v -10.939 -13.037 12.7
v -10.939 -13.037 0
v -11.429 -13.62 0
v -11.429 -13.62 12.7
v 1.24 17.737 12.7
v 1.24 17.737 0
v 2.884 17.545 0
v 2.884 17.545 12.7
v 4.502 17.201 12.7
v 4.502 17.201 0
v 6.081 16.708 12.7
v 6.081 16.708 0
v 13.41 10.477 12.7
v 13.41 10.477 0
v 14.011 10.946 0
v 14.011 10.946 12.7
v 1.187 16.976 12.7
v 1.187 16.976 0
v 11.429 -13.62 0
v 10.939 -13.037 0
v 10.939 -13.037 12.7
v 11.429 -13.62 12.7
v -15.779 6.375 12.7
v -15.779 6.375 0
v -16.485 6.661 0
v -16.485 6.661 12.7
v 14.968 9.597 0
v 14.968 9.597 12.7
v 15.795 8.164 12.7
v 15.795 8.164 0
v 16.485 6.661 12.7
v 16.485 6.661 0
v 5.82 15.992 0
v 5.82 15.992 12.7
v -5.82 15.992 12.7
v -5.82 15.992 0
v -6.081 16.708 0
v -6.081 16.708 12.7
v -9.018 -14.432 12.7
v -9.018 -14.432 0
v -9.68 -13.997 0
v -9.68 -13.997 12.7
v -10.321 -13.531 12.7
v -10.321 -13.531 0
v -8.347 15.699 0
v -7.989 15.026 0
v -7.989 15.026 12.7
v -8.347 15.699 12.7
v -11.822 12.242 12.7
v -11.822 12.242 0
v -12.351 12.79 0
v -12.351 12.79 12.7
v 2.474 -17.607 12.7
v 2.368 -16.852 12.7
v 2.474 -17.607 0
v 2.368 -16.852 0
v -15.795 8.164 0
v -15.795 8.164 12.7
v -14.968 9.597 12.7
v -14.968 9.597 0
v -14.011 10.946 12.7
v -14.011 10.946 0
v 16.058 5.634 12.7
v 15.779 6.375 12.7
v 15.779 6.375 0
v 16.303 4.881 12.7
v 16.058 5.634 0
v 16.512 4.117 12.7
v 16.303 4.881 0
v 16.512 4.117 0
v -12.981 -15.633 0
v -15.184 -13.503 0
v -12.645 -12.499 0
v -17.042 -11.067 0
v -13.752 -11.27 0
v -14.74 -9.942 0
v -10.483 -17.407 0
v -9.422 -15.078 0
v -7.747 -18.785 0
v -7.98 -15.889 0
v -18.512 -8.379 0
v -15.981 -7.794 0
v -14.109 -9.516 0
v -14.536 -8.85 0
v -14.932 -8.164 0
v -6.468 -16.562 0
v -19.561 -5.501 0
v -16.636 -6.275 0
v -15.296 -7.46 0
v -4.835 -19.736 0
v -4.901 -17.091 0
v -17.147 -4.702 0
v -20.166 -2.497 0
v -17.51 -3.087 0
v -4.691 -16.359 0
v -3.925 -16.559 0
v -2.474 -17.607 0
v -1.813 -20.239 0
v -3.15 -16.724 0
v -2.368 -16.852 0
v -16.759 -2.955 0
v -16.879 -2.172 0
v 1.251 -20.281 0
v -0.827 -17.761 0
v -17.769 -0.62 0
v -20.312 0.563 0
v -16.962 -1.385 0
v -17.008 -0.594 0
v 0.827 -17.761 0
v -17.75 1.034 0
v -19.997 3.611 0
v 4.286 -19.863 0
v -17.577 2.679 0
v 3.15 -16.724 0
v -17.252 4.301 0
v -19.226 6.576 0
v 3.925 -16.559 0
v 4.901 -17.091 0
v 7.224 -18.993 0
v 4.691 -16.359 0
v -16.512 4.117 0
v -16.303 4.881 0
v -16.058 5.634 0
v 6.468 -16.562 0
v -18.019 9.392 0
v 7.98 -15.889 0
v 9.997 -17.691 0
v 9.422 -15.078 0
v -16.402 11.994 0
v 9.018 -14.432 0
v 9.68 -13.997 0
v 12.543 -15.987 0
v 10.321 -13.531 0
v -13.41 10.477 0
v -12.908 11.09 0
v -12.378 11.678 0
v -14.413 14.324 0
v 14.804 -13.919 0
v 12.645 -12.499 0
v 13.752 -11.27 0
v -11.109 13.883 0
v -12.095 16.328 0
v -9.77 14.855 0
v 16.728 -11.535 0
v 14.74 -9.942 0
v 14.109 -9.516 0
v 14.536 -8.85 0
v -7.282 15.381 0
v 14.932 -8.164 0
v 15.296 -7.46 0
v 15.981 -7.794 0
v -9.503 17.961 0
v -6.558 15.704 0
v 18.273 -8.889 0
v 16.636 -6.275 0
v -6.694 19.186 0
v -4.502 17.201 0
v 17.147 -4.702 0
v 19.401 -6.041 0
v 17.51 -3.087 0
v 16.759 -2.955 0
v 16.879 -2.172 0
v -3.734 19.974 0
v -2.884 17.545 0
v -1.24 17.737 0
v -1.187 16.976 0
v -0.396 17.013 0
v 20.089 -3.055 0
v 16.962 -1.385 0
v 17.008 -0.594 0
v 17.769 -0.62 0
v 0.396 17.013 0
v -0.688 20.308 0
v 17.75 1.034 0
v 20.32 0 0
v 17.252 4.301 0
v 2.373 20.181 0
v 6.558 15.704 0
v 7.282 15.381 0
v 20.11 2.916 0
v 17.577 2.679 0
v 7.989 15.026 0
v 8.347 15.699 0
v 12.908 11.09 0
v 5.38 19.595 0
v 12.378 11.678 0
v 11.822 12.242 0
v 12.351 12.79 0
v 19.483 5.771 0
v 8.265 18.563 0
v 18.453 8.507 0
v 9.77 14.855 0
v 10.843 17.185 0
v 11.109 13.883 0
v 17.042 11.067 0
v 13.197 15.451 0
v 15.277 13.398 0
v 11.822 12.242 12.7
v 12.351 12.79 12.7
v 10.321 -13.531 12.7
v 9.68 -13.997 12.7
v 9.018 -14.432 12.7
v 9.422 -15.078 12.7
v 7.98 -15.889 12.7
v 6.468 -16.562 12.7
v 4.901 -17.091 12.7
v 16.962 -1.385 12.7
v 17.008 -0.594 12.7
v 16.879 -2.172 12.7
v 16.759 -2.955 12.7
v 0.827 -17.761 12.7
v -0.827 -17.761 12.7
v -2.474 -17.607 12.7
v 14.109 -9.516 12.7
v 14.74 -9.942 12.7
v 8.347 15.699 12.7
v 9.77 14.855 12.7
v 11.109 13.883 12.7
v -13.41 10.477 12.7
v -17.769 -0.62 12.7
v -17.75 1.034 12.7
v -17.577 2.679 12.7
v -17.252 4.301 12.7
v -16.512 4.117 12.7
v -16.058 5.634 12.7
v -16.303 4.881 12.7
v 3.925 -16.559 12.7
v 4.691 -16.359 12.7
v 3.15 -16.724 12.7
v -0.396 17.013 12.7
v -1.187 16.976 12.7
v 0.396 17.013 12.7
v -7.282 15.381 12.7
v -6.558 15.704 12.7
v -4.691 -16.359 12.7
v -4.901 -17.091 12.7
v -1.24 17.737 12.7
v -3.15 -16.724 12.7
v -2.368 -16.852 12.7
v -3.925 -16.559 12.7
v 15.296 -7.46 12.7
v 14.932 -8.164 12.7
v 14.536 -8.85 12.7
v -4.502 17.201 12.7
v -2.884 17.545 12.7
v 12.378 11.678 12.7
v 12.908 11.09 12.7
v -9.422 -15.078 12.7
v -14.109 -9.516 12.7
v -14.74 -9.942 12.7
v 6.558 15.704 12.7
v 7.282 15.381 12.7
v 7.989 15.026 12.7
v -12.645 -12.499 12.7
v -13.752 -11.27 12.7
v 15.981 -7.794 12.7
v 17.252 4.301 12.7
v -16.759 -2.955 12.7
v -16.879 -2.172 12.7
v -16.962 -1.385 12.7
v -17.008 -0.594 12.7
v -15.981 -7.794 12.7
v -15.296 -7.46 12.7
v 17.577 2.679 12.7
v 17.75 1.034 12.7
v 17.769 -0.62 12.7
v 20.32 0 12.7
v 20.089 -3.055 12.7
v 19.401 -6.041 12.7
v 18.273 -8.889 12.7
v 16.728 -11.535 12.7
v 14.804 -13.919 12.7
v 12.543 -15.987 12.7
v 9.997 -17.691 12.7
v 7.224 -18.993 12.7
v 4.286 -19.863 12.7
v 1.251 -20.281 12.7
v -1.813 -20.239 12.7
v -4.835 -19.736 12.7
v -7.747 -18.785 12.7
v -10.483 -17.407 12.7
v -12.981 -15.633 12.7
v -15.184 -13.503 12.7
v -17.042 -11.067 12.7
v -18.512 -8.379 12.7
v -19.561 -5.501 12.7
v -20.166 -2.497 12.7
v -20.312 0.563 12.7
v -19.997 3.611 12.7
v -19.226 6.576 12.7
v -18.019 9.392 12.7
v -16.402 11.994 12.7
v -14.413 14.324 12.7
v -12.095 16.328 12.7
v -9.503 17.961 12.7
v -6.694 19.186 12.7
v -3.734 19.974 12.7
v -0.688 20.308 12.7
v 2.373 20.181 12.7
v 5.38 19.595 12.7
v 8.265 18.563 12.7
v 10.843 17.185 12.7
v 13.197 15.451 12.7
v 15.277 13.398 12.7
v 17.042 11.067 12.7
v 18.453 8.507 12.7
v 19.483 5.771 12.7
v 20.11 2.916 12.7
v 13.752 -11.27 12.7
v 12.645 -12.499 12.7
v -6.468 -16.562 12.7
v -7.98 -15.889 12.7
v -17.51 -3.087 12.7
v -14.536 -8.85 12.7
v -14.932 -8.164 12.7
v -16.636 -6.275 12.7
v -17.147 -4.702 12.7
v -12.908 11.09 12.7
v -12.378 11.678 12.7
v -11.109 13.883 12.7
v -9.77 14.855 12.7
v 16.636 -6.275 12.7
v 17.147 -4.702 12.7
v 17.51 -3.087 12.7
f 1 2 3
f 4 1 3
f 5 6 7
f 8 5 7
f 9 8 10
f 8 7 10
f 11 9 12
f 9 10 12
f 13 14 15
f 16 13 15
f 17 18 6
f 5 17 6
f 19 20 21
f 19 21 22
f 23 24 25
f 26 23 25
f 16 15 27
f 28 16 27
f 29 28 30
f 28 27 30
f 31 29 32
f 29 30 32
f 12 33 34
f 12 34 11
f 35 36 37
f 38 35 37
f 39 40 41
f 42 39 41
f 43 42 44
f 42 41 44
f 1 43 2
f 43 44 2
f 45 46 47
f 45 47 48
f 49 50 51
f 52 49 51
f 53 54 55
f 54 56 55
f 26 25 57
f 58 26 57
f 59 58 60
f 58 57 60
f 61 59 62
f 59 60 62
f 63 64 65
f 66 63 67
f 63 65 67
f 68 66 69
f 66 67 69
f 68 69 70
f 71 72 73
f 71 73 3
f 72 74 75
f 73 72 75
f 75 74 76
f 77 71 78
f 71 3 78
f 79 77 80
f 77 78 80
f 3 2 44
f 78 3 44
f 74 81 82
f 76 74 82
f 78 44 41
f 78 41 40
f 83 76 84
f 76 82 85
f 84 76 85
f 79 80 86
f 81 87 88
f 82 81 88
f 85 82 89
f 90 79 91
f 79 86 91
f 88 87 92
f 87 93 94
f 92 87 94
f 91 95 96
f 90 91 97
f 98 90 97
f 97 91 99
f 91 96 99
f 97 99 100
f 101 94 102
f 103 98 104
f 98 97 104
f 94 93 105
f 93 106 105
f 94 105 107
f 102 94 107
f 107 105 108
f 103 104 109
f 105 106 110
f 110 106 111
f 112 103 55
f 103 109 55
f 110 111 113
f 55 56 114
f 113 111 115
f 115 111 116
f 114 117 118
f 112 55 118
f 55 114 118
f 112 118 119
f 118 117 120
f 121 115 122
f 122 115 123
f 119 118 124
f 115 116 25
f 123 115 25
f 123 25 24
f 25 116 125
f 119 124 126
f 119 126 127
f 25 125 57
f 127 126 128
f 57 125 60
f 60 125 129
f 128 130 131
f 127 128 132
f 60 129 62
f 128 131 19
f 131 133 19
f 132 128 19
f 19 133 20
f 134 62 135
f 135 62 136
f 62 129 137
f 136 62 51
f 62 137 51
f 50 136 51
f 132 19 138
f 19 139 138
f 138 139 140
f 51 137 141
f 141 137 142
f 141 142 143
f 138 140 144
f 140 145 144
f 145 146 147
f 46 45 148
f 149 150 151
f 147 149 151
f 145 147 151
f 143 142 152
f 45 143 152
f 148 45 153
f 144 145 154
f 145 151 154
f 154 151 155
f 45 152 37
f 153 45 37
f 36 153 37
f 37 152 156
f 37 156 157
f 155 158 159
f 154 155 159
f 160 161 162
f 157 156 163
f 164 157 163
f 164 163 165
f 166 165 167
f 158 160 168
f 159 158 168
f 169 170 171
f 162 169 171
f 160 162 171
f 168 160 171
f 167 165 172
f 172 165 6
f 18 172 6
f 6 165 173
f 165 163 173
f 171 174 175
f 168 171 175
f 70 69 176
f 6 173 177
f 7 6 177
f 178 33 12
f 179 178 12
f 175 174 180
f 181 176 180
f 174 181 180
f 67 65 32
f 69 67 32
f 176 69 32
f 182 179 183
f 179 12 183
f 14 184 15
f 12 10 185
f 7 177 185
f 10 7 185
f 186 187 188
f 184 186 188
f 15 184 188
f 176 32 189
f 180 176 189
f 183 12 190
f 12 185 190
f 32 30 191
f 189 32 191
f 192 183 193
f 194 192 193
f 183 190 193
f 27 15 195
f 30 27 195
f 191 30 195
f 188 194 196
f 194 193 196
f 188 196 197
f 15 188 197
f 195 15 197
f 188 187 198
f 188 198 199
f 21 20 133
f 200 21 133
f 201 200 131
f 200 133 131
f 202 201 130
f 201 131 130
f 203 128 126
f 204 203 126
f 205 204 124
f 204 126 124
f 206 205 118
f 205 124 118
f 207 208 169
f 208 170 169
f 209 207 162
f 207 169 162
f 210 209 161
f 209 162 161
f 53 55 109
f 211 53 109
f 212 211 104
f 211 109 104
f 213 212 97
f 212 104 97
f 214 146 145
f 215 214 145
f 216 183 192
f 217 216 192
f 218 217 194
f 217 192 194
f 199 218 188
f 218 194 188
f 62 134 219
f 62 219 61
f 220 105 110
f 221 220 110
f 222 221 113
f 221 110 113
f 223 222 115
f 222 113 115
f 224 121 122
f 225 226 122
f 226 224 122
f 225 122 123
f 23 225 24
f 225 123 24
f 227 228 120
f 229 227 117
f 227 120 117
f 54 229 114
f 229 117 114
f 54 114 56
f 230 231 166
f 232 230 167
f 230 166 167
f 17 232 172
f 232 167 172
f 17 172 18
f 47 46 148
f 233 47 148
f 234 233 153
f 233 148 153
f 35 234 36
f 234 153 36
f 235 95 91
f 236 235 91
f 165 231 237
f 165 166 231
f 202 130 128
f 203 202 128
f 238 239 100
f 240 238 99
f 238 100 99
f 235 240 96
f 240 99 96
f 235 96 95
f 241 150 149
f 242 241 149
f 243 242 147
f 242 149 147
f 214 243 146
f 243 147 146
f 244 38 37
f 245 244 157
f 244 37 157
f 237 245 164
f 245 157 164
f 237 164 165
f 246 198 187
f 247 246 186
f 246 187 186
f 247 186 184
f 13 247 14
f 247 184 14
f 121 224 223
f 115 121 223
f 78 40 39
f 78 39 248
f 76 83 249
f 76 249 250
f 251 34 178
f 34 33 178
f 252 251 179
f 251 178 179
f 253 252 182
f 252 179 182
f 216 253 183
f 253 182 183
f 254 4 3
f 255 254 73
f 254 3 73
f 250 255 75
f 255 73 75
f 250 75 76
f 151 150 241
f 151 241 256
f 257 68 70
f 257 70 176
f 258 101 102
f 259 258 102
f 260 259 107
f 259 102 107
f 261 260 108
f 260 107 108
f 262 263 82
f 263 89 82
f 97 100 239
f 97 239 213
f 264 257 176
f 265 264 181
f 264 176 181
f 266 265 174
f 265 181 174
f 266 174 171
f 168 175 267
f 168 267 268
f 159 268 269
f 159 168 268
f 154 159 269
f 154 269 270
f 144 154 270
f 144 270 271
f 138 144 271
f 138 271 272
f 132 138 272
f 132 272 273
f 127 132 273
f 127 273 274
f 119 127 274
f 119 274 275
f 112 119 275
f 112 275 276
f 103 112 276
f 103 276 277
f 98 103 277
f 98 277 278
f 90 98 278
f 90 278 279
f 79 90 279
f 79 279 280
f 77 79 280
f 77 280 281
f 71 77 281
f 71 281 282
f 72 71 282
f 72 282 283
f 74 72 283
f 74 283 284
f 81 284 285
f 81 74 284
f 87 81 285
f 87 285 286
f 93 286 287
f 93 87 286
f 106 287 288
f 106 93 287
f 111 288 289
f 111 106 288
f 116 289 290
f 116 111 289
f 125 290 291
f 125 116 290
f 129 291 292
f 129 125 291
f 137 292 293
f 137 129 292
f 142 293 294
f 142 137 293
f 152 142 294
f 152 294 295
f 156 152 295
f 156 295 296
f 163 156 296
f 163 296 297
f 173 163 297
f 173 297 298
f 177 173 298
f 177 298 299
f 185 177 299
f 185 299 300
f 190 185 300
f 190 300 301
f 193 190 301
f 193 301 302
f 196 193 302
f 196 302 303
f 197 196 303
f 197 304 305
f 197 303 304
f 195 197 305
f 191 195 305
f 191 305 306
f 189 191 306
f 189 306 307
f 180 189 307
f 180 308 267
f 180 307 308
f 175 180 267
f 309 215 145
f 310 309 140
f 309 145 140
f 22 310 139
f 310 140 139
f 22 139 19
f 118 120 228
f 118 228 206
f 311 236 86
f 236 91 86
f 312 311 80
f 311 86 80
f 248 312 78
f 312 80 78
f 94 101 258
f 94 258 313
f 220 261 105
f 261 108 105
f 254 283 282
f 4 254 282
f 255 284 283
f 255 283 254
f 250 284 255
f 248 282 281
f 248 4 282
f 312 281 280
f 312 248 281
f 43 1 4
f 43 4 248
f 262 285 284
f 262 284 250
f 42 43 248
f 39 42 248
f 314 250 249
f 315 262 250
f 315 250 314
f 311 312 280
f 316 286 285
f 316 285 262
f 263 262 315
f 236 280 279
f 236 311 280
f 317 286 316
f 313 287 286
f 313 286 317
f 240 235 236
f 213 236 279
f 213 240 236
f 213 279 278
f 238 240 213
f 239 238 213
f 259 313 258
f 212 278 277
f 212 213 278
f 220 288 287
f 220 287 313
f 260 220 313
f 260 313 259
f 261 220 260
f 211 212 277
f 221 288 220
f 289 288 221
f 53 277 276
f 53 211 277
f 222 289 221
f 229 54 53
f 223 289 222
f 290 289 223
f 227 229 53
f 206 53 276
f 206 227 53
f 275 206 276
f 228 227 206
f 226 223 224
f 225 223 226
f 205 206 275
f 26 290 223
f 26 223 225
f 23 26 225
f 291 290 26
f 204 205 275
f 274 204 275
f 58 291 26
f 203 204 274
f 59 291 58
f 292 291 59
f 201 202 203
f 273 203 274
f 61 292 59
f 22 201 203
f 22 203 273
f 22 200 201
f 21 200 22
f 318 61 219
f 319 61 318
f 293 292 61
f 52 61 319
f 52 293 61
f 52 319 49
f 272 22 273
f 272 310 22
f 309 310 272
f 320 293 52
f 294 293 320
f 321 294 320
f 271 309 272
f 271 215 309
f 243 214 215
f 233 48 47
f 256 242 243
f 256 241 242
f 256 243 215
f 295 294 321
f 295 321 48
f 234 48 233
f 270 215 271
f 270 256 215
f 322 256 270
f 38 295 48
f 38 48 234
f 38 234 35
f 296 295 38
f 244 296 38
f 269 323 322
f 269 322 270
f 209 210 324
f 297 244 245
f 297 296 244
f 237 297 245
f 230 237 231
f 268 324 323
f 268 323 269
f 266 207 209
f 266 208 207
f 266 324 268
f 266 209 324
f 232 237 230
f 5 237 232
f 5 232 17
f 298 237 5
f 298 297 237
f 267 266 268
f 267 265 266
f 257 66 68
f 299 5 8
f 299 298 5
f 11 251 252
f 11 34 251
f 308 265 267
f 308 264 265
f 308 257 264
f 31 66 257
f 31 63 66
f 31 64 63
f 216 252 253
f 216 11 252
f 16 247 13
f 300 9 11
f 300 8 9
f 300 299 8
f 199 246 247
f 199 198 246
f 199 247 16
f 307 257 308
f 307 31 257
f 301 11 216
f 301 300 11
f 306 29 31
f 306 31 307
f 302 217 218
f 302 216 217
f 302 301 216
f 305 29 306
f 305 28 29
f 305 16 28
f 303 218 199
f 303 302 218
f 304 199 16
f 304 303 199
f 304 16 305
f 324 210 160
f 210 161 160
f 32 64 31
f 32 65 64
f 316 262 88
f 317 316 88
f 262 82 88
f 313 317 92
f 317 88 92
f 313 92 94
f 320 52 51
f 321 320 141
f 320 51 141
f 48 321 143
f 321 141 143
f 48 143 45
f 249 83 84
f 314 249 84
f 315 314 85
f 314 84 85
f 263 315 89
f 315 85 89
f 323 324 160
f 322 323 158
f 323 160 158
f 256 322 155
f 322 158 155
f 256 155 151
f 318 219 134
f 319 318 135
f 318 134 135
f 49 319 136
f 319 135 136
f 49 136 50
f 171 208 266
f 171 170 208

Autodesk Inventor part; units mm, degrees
ref_plane "YZ Plane" through (0, 0, 0) normal (1, 0, 0) x (0, 1, 0)
ref_plane "XZ Plane" through (0, 0, 0) normal (0, 1, 0) x (-1, 0, 0)
ref_plane "XY Plane" through (0, 0, 0) normal (0, 0, 1) x (1, 0, 0)
sketch "Sketch1" plane through (0, 0, 0) normal (0, 0, 1) x (1, 0, 0)
  circle A0 centre (0, 0) radius 20.32
  circle A1 centre (0, 0) radius 17.78
  arc A2 (1.1871, 16.9765) -> (-1.1871, 16.9765) centre (0, 0) ccw
  line L0 (0, 17.018) -> (0, 20.32)
  line L1 (1.1871, 16.9765) -> (1.2403, 17.7367)
  line L2 (-1.1871, 16.9765) -> (-1.2403, 17.7367)
  dimension "d0" = 40.64
  dimension "d1" = 2.54
  dimension "d2" = 0.762
  dimension "d3" = 4
  dimension "d4" = 4
extrude "Extrusion1" add sketch "Sketch1" along normal blind 12.7 contours A1 L1 A2 L0 | L0 A2 L2 A1 | A0
pattern_circular "Circular Pattern1" count 15 over 360 about axis through (0, 0, 0) along (0, 0, 1) of "Extrusion1"
properties part number "RubberWheelNT"
